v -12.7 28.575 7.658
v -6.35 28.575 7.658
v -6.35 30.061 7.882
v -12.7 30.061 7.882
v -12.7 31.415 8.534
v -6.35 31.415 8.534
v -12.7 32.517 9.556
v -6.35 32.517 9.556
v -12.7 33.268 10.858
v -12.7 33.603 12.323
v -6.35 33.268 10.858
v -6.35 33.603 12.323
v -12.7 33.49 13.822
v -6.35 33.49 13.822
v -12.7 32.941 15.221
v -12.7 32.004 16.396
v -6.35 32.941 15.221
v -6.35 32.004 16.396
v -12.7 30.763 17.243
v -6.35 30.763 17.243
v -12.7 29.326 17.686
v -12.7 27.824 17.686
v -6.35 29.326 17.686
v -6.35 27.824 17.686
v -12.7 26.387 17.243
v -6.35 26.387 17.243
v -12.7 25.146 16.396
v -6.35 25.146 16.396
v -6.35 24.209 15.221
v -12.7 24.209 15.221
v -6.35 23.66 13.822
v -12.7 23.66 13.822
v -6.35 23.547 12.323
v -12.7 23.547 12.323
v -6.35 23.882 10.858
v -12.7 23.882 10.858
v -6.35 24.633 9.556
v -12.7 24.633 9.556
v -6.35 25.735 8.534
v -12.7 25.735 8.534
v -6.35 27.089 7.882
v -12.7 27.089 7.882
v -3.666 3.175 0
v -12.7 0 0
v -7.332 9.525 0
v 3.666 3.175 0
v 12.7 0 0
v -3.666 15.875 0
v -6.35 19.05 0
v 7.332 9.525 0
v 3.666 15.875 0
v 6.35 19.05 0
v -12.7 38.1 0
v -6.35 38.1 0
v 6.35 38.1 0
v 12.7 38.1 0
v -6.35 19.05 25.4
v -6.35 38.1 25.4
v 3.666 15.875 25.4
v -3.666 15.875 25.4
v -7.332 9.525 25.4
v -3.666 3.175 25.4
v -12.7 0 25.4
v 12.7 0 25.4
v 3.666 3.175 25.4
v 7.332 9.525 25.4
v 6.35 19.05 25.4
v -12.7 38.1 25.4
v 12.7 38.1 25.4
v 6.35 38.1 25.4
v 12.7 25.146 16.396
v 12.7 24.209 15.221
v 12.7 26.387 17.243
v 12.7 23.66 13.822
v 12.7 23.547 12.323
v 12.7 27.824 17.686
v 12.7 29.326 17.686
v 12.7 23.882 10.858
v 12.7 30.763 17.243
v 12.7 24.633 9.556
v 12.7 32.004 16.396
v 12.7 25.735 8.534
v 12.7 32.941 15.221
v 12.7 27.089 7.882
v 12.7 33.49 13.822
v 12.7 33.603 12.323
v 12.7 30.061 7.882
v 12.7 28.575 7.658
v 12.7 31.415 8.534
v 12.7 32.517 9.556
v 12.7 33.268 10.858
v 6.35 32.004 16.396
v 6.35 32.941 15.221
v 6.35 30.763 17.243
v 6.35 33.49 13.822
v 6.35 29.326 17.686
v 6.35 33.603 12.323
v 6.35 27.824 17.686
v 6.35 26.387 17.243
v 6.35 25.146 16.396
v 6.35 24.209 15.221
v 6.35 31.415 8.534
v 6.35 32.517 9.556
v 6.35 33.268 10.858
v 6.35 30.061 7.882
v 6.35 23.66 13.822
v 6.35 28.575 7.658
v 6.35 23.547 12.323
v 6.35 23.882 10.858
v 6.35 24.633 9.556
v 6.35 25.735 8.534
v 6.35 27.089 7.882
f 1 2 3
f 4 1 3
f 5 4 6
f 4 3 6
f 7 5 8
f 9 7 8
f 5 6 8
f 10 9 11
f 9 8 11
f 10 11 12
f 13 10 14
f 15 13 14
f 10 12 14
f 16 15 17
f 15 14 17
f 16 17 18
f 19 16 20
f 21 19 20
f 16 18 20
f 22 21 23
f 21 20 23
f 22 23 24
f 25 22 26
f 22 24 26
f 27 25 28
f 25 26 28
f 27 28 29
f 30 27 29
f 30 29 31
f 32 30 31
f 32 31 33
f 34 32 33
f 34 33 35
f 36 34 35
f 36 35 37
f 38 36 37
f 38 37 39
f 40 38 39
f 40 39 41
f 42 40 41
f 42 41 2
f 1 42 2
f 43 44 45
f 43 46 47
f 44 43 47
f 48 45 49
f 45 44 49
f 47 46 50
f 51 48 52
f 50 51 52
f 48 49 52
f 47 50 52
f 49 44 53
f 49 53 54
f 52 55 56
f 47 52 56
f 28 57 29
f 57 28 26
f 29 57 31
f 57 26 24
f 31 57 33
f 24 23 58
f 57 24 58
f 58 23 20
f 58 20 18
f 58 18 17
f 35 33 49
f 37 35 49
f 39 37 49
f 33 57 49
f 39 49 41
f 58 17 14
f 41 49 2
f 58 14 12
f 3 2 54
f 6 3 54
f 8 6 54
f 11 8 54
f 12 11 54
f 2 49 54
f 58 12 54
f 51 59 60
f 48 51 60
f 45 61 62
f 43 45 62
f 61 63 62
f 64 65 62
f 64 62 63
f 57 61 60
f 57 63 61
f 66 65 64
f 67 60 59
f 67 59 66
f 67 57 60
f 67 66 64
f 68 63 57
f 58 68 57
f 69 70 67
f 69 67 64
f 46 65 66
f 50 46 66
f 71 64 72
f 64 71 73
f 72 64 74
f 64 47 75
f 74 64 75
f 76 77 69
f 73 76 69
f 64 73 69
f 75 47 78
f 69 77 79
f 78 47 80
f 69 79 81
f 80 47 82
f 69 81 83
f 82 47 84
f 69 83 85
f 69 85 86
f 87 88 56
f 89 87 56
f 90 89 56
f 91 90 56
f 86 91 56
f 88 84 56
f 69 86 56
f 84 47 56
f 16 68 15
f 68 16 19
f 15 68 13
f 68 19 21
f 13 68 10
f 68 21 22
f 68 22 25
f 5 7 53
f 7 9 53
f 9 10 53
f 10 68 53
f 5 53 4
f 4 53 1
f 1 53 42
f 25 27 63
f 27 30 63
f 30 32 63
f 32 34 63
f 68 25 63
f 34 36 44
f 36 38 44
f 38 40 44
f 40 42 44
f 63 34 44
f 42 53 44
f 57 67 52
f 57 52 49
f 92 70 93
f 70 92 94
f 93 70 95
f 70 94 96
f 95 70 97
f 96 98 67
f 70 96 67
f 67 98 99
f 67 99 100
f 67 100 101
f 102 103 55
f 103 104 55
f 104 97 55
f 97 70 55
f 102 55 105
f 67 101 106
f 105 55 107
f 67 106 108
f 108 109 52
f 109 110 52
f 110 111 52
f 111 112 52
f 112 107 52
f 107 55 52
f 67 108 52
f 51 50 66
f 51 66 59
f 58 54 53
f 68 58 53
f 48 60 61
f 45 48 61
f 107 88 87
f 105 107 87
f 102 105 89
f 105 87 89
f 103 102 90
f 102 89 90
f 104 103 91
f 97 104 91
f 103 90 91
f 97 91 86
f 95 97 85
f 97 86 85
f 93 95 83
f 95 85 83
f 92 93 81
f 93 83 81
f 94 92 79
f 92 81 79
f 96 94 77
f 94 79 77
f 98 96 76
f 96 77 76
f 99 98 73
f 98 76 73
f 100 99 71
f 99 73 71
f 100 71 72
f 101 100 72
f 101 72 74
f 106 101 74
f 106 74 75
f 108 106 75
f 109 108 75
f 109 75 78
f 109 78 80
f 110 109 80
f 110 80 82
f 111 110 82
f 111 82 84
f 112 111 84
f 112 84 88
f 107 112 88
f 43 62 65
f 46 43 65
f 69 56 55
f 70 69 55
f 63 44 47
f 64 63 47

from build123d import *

# Parameters (mm, degrees)
BOSS_EXTRUDE1_DEPTH     = 25.4
CUT_EXTRUDE1_DEPTH      = 48.519048812
F_3_8_CLEARANCE_HOLE1_D = 10.0838


with BuildPart() as part:
    # Sketch1 → Boss-Extrude1 (new body)
    with BuildSketch(Plane.XY):
        Polygon((-12.7, 0), (12.7, 0), (12.7, 38.1), (6.35, 38.1), (6.35, 19.05), (-6.35, 19.05), (-6.35, 38.1), (-12.7, 38.1), align=None)
    extrude(amount=BOSS_EXTRUDE1_DEPTH)

    # Sketch2 → Cut-Extrude1 (cut, through all)
    with BuildSketch(Plane.XY.offset(25.4)):
        Polygon((3.666174209, 15.875), (-3.666174209, 15.875), (-7.332348419, 9.525), (-3.666174209, 3.175), (3.666174209, 3.175), (7.332348419, 9.525), align=None)
    extrude(amount=-CUT_EXTRUDE1_DEPTH, mode=Mode.SUBTRACT)

    # 3/8 Clearance Hole1 (through all)
    with Locations(Plane.ZY.offset(12.7)):
        with Locations((12.7, 28.575)):
            Hole(F_3_8_CLEARANCE_HOLE1_D / 2)


solid = part.part
